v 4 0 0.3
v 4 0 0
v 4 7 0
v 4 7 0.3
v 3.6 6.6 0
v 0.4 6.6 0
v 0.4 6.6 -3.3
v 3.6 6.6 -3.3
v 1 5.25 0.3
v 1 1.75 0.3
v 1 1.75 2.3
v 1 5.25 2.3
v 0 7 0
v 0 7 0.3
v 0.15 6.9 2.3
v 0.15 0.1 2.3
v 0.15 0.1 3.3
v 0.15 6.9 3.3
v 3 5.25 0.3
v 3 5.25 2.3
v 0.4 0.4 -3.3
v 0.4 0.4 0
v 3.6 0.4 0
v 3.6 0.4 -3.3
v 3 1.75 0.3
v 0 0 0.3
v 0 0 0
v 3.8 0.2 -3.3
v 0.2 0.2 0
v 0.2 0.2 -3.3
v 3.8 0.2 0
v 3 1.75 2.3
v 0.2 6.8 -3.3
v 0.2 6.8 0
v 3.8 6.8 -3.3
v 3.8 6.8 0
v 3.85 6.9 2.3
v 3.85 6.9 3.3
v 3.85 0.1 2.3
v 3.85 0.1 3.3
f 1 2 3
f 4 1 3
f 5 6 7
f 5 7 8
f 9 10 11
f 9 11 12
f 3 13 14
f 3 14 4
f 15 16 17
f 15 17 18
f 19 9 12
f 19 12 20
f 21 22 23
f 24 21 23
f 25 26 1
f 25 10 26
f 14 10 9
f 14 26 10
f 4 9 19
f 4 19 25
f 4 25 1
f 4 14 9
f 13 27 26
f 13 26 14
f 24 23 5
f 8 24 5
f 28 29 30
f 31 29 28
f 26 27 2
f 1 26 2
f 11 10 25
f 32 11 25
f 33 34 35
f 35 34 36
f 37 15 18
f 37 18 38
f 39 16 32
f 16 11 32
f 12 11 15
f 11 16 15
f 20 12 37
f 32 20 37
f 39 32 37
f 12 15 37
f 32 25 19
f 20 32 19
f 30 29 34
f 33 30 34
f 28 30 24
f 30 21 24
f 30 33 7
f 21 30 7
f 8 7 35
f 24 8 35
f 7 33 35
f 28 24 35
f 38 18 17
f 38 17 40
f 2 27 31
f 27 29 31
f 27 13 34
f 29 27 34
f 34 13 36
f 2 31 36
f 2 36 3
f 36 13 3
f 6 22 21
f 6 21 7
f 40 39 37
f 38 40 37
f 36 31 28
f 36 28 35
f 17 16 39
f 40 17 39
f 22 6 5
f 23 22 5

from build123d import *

# Parameters (mm, degrees)
SCHIZZO1_W                   = 4
SCHIZZO1_H                   = 7
ESTRUSIONE_ESTRUSIONE1_DEPTH = 0.3
SCHIZZO2_W                   = 3.6
SCHIZZO2_H                   = 6.6
ESTRUSIONE_ESTRUSIONE2_DEPTH = 3.3
SCHIZZO3_W                   = 3.2
SCHIZZO3_H                   = 6.2
TAGLIO_ESTRUSIONE1_DEPTH     = 4.3
SCHIZZO6_W                   = 2
SCHIZZO6_H                   = 3.5
ESTRUSIONE_ESTRUSIONE3_DEPTH = 2.3
SCHIZZO7_W                   = 3.7
SCHIZZO7_H                   = 6.8
ESTRUSIONE_ESTRUSIONE4_DEPTH = 1


with BuildPart() as part:
    # Schizzo1 → Estrusione-Estrusione1 (new body)
    with BuildSketch(Plane.XY):
        with Locations((2, 3.5)):
            Rectangle(SCHIZZO1_W, SCHIZZO1_H)
    extrude(amount=ESTRUSIONE_ESTRUSIONE1_DEPTH)

    # Schizzo2 → Estrusione-Estrusione2 (add)
    with BuildSketch(Plane.XY):
        with Locations((2, 3.5)):
            Rectangle(SCHIZZO2_W, SCHIZZO2_H)
    extrude(amount=-ESTRUSIONE_ESTRUSIONE2_DEPTH)

    # Schizzo3 → Taglio-Estrusione1 (cut, through all)
    with BuildSketch(Plane.XY):
        with Locations((2, 3.5)):
            Rectangle(SCHIZZO3_W, SCHIZZO3_H)
    extrude(amount=-TAGLIO_ESTRUSIONE1_DEPTH, mode=Mode.SUBTRACT)

    # Schizzo6 → Estrusione-Estrusione3 (add)
    with BuildSketch(Plane.XY):
        with Locations((2, 3.5)):
            Rectangle(SCHIZZO6_W, SCHIZZO6_H)
    extrude(amount=ESTRUSIONE_ESTRUSIONE3_DEPTH)

    # Schizzo7 → Estrusione-Estrusione4 (add)
    with BuildSketch(Plane.XY.offset(2.3)):
        with Locations((2, 3.5)):
            Rectangle(SCHIZZO7_W, SCHIZZO7_H)
    extrude(amount=ESTRUSIONE_ESTRUSIONE4_DEPTH)


solid = part.part
